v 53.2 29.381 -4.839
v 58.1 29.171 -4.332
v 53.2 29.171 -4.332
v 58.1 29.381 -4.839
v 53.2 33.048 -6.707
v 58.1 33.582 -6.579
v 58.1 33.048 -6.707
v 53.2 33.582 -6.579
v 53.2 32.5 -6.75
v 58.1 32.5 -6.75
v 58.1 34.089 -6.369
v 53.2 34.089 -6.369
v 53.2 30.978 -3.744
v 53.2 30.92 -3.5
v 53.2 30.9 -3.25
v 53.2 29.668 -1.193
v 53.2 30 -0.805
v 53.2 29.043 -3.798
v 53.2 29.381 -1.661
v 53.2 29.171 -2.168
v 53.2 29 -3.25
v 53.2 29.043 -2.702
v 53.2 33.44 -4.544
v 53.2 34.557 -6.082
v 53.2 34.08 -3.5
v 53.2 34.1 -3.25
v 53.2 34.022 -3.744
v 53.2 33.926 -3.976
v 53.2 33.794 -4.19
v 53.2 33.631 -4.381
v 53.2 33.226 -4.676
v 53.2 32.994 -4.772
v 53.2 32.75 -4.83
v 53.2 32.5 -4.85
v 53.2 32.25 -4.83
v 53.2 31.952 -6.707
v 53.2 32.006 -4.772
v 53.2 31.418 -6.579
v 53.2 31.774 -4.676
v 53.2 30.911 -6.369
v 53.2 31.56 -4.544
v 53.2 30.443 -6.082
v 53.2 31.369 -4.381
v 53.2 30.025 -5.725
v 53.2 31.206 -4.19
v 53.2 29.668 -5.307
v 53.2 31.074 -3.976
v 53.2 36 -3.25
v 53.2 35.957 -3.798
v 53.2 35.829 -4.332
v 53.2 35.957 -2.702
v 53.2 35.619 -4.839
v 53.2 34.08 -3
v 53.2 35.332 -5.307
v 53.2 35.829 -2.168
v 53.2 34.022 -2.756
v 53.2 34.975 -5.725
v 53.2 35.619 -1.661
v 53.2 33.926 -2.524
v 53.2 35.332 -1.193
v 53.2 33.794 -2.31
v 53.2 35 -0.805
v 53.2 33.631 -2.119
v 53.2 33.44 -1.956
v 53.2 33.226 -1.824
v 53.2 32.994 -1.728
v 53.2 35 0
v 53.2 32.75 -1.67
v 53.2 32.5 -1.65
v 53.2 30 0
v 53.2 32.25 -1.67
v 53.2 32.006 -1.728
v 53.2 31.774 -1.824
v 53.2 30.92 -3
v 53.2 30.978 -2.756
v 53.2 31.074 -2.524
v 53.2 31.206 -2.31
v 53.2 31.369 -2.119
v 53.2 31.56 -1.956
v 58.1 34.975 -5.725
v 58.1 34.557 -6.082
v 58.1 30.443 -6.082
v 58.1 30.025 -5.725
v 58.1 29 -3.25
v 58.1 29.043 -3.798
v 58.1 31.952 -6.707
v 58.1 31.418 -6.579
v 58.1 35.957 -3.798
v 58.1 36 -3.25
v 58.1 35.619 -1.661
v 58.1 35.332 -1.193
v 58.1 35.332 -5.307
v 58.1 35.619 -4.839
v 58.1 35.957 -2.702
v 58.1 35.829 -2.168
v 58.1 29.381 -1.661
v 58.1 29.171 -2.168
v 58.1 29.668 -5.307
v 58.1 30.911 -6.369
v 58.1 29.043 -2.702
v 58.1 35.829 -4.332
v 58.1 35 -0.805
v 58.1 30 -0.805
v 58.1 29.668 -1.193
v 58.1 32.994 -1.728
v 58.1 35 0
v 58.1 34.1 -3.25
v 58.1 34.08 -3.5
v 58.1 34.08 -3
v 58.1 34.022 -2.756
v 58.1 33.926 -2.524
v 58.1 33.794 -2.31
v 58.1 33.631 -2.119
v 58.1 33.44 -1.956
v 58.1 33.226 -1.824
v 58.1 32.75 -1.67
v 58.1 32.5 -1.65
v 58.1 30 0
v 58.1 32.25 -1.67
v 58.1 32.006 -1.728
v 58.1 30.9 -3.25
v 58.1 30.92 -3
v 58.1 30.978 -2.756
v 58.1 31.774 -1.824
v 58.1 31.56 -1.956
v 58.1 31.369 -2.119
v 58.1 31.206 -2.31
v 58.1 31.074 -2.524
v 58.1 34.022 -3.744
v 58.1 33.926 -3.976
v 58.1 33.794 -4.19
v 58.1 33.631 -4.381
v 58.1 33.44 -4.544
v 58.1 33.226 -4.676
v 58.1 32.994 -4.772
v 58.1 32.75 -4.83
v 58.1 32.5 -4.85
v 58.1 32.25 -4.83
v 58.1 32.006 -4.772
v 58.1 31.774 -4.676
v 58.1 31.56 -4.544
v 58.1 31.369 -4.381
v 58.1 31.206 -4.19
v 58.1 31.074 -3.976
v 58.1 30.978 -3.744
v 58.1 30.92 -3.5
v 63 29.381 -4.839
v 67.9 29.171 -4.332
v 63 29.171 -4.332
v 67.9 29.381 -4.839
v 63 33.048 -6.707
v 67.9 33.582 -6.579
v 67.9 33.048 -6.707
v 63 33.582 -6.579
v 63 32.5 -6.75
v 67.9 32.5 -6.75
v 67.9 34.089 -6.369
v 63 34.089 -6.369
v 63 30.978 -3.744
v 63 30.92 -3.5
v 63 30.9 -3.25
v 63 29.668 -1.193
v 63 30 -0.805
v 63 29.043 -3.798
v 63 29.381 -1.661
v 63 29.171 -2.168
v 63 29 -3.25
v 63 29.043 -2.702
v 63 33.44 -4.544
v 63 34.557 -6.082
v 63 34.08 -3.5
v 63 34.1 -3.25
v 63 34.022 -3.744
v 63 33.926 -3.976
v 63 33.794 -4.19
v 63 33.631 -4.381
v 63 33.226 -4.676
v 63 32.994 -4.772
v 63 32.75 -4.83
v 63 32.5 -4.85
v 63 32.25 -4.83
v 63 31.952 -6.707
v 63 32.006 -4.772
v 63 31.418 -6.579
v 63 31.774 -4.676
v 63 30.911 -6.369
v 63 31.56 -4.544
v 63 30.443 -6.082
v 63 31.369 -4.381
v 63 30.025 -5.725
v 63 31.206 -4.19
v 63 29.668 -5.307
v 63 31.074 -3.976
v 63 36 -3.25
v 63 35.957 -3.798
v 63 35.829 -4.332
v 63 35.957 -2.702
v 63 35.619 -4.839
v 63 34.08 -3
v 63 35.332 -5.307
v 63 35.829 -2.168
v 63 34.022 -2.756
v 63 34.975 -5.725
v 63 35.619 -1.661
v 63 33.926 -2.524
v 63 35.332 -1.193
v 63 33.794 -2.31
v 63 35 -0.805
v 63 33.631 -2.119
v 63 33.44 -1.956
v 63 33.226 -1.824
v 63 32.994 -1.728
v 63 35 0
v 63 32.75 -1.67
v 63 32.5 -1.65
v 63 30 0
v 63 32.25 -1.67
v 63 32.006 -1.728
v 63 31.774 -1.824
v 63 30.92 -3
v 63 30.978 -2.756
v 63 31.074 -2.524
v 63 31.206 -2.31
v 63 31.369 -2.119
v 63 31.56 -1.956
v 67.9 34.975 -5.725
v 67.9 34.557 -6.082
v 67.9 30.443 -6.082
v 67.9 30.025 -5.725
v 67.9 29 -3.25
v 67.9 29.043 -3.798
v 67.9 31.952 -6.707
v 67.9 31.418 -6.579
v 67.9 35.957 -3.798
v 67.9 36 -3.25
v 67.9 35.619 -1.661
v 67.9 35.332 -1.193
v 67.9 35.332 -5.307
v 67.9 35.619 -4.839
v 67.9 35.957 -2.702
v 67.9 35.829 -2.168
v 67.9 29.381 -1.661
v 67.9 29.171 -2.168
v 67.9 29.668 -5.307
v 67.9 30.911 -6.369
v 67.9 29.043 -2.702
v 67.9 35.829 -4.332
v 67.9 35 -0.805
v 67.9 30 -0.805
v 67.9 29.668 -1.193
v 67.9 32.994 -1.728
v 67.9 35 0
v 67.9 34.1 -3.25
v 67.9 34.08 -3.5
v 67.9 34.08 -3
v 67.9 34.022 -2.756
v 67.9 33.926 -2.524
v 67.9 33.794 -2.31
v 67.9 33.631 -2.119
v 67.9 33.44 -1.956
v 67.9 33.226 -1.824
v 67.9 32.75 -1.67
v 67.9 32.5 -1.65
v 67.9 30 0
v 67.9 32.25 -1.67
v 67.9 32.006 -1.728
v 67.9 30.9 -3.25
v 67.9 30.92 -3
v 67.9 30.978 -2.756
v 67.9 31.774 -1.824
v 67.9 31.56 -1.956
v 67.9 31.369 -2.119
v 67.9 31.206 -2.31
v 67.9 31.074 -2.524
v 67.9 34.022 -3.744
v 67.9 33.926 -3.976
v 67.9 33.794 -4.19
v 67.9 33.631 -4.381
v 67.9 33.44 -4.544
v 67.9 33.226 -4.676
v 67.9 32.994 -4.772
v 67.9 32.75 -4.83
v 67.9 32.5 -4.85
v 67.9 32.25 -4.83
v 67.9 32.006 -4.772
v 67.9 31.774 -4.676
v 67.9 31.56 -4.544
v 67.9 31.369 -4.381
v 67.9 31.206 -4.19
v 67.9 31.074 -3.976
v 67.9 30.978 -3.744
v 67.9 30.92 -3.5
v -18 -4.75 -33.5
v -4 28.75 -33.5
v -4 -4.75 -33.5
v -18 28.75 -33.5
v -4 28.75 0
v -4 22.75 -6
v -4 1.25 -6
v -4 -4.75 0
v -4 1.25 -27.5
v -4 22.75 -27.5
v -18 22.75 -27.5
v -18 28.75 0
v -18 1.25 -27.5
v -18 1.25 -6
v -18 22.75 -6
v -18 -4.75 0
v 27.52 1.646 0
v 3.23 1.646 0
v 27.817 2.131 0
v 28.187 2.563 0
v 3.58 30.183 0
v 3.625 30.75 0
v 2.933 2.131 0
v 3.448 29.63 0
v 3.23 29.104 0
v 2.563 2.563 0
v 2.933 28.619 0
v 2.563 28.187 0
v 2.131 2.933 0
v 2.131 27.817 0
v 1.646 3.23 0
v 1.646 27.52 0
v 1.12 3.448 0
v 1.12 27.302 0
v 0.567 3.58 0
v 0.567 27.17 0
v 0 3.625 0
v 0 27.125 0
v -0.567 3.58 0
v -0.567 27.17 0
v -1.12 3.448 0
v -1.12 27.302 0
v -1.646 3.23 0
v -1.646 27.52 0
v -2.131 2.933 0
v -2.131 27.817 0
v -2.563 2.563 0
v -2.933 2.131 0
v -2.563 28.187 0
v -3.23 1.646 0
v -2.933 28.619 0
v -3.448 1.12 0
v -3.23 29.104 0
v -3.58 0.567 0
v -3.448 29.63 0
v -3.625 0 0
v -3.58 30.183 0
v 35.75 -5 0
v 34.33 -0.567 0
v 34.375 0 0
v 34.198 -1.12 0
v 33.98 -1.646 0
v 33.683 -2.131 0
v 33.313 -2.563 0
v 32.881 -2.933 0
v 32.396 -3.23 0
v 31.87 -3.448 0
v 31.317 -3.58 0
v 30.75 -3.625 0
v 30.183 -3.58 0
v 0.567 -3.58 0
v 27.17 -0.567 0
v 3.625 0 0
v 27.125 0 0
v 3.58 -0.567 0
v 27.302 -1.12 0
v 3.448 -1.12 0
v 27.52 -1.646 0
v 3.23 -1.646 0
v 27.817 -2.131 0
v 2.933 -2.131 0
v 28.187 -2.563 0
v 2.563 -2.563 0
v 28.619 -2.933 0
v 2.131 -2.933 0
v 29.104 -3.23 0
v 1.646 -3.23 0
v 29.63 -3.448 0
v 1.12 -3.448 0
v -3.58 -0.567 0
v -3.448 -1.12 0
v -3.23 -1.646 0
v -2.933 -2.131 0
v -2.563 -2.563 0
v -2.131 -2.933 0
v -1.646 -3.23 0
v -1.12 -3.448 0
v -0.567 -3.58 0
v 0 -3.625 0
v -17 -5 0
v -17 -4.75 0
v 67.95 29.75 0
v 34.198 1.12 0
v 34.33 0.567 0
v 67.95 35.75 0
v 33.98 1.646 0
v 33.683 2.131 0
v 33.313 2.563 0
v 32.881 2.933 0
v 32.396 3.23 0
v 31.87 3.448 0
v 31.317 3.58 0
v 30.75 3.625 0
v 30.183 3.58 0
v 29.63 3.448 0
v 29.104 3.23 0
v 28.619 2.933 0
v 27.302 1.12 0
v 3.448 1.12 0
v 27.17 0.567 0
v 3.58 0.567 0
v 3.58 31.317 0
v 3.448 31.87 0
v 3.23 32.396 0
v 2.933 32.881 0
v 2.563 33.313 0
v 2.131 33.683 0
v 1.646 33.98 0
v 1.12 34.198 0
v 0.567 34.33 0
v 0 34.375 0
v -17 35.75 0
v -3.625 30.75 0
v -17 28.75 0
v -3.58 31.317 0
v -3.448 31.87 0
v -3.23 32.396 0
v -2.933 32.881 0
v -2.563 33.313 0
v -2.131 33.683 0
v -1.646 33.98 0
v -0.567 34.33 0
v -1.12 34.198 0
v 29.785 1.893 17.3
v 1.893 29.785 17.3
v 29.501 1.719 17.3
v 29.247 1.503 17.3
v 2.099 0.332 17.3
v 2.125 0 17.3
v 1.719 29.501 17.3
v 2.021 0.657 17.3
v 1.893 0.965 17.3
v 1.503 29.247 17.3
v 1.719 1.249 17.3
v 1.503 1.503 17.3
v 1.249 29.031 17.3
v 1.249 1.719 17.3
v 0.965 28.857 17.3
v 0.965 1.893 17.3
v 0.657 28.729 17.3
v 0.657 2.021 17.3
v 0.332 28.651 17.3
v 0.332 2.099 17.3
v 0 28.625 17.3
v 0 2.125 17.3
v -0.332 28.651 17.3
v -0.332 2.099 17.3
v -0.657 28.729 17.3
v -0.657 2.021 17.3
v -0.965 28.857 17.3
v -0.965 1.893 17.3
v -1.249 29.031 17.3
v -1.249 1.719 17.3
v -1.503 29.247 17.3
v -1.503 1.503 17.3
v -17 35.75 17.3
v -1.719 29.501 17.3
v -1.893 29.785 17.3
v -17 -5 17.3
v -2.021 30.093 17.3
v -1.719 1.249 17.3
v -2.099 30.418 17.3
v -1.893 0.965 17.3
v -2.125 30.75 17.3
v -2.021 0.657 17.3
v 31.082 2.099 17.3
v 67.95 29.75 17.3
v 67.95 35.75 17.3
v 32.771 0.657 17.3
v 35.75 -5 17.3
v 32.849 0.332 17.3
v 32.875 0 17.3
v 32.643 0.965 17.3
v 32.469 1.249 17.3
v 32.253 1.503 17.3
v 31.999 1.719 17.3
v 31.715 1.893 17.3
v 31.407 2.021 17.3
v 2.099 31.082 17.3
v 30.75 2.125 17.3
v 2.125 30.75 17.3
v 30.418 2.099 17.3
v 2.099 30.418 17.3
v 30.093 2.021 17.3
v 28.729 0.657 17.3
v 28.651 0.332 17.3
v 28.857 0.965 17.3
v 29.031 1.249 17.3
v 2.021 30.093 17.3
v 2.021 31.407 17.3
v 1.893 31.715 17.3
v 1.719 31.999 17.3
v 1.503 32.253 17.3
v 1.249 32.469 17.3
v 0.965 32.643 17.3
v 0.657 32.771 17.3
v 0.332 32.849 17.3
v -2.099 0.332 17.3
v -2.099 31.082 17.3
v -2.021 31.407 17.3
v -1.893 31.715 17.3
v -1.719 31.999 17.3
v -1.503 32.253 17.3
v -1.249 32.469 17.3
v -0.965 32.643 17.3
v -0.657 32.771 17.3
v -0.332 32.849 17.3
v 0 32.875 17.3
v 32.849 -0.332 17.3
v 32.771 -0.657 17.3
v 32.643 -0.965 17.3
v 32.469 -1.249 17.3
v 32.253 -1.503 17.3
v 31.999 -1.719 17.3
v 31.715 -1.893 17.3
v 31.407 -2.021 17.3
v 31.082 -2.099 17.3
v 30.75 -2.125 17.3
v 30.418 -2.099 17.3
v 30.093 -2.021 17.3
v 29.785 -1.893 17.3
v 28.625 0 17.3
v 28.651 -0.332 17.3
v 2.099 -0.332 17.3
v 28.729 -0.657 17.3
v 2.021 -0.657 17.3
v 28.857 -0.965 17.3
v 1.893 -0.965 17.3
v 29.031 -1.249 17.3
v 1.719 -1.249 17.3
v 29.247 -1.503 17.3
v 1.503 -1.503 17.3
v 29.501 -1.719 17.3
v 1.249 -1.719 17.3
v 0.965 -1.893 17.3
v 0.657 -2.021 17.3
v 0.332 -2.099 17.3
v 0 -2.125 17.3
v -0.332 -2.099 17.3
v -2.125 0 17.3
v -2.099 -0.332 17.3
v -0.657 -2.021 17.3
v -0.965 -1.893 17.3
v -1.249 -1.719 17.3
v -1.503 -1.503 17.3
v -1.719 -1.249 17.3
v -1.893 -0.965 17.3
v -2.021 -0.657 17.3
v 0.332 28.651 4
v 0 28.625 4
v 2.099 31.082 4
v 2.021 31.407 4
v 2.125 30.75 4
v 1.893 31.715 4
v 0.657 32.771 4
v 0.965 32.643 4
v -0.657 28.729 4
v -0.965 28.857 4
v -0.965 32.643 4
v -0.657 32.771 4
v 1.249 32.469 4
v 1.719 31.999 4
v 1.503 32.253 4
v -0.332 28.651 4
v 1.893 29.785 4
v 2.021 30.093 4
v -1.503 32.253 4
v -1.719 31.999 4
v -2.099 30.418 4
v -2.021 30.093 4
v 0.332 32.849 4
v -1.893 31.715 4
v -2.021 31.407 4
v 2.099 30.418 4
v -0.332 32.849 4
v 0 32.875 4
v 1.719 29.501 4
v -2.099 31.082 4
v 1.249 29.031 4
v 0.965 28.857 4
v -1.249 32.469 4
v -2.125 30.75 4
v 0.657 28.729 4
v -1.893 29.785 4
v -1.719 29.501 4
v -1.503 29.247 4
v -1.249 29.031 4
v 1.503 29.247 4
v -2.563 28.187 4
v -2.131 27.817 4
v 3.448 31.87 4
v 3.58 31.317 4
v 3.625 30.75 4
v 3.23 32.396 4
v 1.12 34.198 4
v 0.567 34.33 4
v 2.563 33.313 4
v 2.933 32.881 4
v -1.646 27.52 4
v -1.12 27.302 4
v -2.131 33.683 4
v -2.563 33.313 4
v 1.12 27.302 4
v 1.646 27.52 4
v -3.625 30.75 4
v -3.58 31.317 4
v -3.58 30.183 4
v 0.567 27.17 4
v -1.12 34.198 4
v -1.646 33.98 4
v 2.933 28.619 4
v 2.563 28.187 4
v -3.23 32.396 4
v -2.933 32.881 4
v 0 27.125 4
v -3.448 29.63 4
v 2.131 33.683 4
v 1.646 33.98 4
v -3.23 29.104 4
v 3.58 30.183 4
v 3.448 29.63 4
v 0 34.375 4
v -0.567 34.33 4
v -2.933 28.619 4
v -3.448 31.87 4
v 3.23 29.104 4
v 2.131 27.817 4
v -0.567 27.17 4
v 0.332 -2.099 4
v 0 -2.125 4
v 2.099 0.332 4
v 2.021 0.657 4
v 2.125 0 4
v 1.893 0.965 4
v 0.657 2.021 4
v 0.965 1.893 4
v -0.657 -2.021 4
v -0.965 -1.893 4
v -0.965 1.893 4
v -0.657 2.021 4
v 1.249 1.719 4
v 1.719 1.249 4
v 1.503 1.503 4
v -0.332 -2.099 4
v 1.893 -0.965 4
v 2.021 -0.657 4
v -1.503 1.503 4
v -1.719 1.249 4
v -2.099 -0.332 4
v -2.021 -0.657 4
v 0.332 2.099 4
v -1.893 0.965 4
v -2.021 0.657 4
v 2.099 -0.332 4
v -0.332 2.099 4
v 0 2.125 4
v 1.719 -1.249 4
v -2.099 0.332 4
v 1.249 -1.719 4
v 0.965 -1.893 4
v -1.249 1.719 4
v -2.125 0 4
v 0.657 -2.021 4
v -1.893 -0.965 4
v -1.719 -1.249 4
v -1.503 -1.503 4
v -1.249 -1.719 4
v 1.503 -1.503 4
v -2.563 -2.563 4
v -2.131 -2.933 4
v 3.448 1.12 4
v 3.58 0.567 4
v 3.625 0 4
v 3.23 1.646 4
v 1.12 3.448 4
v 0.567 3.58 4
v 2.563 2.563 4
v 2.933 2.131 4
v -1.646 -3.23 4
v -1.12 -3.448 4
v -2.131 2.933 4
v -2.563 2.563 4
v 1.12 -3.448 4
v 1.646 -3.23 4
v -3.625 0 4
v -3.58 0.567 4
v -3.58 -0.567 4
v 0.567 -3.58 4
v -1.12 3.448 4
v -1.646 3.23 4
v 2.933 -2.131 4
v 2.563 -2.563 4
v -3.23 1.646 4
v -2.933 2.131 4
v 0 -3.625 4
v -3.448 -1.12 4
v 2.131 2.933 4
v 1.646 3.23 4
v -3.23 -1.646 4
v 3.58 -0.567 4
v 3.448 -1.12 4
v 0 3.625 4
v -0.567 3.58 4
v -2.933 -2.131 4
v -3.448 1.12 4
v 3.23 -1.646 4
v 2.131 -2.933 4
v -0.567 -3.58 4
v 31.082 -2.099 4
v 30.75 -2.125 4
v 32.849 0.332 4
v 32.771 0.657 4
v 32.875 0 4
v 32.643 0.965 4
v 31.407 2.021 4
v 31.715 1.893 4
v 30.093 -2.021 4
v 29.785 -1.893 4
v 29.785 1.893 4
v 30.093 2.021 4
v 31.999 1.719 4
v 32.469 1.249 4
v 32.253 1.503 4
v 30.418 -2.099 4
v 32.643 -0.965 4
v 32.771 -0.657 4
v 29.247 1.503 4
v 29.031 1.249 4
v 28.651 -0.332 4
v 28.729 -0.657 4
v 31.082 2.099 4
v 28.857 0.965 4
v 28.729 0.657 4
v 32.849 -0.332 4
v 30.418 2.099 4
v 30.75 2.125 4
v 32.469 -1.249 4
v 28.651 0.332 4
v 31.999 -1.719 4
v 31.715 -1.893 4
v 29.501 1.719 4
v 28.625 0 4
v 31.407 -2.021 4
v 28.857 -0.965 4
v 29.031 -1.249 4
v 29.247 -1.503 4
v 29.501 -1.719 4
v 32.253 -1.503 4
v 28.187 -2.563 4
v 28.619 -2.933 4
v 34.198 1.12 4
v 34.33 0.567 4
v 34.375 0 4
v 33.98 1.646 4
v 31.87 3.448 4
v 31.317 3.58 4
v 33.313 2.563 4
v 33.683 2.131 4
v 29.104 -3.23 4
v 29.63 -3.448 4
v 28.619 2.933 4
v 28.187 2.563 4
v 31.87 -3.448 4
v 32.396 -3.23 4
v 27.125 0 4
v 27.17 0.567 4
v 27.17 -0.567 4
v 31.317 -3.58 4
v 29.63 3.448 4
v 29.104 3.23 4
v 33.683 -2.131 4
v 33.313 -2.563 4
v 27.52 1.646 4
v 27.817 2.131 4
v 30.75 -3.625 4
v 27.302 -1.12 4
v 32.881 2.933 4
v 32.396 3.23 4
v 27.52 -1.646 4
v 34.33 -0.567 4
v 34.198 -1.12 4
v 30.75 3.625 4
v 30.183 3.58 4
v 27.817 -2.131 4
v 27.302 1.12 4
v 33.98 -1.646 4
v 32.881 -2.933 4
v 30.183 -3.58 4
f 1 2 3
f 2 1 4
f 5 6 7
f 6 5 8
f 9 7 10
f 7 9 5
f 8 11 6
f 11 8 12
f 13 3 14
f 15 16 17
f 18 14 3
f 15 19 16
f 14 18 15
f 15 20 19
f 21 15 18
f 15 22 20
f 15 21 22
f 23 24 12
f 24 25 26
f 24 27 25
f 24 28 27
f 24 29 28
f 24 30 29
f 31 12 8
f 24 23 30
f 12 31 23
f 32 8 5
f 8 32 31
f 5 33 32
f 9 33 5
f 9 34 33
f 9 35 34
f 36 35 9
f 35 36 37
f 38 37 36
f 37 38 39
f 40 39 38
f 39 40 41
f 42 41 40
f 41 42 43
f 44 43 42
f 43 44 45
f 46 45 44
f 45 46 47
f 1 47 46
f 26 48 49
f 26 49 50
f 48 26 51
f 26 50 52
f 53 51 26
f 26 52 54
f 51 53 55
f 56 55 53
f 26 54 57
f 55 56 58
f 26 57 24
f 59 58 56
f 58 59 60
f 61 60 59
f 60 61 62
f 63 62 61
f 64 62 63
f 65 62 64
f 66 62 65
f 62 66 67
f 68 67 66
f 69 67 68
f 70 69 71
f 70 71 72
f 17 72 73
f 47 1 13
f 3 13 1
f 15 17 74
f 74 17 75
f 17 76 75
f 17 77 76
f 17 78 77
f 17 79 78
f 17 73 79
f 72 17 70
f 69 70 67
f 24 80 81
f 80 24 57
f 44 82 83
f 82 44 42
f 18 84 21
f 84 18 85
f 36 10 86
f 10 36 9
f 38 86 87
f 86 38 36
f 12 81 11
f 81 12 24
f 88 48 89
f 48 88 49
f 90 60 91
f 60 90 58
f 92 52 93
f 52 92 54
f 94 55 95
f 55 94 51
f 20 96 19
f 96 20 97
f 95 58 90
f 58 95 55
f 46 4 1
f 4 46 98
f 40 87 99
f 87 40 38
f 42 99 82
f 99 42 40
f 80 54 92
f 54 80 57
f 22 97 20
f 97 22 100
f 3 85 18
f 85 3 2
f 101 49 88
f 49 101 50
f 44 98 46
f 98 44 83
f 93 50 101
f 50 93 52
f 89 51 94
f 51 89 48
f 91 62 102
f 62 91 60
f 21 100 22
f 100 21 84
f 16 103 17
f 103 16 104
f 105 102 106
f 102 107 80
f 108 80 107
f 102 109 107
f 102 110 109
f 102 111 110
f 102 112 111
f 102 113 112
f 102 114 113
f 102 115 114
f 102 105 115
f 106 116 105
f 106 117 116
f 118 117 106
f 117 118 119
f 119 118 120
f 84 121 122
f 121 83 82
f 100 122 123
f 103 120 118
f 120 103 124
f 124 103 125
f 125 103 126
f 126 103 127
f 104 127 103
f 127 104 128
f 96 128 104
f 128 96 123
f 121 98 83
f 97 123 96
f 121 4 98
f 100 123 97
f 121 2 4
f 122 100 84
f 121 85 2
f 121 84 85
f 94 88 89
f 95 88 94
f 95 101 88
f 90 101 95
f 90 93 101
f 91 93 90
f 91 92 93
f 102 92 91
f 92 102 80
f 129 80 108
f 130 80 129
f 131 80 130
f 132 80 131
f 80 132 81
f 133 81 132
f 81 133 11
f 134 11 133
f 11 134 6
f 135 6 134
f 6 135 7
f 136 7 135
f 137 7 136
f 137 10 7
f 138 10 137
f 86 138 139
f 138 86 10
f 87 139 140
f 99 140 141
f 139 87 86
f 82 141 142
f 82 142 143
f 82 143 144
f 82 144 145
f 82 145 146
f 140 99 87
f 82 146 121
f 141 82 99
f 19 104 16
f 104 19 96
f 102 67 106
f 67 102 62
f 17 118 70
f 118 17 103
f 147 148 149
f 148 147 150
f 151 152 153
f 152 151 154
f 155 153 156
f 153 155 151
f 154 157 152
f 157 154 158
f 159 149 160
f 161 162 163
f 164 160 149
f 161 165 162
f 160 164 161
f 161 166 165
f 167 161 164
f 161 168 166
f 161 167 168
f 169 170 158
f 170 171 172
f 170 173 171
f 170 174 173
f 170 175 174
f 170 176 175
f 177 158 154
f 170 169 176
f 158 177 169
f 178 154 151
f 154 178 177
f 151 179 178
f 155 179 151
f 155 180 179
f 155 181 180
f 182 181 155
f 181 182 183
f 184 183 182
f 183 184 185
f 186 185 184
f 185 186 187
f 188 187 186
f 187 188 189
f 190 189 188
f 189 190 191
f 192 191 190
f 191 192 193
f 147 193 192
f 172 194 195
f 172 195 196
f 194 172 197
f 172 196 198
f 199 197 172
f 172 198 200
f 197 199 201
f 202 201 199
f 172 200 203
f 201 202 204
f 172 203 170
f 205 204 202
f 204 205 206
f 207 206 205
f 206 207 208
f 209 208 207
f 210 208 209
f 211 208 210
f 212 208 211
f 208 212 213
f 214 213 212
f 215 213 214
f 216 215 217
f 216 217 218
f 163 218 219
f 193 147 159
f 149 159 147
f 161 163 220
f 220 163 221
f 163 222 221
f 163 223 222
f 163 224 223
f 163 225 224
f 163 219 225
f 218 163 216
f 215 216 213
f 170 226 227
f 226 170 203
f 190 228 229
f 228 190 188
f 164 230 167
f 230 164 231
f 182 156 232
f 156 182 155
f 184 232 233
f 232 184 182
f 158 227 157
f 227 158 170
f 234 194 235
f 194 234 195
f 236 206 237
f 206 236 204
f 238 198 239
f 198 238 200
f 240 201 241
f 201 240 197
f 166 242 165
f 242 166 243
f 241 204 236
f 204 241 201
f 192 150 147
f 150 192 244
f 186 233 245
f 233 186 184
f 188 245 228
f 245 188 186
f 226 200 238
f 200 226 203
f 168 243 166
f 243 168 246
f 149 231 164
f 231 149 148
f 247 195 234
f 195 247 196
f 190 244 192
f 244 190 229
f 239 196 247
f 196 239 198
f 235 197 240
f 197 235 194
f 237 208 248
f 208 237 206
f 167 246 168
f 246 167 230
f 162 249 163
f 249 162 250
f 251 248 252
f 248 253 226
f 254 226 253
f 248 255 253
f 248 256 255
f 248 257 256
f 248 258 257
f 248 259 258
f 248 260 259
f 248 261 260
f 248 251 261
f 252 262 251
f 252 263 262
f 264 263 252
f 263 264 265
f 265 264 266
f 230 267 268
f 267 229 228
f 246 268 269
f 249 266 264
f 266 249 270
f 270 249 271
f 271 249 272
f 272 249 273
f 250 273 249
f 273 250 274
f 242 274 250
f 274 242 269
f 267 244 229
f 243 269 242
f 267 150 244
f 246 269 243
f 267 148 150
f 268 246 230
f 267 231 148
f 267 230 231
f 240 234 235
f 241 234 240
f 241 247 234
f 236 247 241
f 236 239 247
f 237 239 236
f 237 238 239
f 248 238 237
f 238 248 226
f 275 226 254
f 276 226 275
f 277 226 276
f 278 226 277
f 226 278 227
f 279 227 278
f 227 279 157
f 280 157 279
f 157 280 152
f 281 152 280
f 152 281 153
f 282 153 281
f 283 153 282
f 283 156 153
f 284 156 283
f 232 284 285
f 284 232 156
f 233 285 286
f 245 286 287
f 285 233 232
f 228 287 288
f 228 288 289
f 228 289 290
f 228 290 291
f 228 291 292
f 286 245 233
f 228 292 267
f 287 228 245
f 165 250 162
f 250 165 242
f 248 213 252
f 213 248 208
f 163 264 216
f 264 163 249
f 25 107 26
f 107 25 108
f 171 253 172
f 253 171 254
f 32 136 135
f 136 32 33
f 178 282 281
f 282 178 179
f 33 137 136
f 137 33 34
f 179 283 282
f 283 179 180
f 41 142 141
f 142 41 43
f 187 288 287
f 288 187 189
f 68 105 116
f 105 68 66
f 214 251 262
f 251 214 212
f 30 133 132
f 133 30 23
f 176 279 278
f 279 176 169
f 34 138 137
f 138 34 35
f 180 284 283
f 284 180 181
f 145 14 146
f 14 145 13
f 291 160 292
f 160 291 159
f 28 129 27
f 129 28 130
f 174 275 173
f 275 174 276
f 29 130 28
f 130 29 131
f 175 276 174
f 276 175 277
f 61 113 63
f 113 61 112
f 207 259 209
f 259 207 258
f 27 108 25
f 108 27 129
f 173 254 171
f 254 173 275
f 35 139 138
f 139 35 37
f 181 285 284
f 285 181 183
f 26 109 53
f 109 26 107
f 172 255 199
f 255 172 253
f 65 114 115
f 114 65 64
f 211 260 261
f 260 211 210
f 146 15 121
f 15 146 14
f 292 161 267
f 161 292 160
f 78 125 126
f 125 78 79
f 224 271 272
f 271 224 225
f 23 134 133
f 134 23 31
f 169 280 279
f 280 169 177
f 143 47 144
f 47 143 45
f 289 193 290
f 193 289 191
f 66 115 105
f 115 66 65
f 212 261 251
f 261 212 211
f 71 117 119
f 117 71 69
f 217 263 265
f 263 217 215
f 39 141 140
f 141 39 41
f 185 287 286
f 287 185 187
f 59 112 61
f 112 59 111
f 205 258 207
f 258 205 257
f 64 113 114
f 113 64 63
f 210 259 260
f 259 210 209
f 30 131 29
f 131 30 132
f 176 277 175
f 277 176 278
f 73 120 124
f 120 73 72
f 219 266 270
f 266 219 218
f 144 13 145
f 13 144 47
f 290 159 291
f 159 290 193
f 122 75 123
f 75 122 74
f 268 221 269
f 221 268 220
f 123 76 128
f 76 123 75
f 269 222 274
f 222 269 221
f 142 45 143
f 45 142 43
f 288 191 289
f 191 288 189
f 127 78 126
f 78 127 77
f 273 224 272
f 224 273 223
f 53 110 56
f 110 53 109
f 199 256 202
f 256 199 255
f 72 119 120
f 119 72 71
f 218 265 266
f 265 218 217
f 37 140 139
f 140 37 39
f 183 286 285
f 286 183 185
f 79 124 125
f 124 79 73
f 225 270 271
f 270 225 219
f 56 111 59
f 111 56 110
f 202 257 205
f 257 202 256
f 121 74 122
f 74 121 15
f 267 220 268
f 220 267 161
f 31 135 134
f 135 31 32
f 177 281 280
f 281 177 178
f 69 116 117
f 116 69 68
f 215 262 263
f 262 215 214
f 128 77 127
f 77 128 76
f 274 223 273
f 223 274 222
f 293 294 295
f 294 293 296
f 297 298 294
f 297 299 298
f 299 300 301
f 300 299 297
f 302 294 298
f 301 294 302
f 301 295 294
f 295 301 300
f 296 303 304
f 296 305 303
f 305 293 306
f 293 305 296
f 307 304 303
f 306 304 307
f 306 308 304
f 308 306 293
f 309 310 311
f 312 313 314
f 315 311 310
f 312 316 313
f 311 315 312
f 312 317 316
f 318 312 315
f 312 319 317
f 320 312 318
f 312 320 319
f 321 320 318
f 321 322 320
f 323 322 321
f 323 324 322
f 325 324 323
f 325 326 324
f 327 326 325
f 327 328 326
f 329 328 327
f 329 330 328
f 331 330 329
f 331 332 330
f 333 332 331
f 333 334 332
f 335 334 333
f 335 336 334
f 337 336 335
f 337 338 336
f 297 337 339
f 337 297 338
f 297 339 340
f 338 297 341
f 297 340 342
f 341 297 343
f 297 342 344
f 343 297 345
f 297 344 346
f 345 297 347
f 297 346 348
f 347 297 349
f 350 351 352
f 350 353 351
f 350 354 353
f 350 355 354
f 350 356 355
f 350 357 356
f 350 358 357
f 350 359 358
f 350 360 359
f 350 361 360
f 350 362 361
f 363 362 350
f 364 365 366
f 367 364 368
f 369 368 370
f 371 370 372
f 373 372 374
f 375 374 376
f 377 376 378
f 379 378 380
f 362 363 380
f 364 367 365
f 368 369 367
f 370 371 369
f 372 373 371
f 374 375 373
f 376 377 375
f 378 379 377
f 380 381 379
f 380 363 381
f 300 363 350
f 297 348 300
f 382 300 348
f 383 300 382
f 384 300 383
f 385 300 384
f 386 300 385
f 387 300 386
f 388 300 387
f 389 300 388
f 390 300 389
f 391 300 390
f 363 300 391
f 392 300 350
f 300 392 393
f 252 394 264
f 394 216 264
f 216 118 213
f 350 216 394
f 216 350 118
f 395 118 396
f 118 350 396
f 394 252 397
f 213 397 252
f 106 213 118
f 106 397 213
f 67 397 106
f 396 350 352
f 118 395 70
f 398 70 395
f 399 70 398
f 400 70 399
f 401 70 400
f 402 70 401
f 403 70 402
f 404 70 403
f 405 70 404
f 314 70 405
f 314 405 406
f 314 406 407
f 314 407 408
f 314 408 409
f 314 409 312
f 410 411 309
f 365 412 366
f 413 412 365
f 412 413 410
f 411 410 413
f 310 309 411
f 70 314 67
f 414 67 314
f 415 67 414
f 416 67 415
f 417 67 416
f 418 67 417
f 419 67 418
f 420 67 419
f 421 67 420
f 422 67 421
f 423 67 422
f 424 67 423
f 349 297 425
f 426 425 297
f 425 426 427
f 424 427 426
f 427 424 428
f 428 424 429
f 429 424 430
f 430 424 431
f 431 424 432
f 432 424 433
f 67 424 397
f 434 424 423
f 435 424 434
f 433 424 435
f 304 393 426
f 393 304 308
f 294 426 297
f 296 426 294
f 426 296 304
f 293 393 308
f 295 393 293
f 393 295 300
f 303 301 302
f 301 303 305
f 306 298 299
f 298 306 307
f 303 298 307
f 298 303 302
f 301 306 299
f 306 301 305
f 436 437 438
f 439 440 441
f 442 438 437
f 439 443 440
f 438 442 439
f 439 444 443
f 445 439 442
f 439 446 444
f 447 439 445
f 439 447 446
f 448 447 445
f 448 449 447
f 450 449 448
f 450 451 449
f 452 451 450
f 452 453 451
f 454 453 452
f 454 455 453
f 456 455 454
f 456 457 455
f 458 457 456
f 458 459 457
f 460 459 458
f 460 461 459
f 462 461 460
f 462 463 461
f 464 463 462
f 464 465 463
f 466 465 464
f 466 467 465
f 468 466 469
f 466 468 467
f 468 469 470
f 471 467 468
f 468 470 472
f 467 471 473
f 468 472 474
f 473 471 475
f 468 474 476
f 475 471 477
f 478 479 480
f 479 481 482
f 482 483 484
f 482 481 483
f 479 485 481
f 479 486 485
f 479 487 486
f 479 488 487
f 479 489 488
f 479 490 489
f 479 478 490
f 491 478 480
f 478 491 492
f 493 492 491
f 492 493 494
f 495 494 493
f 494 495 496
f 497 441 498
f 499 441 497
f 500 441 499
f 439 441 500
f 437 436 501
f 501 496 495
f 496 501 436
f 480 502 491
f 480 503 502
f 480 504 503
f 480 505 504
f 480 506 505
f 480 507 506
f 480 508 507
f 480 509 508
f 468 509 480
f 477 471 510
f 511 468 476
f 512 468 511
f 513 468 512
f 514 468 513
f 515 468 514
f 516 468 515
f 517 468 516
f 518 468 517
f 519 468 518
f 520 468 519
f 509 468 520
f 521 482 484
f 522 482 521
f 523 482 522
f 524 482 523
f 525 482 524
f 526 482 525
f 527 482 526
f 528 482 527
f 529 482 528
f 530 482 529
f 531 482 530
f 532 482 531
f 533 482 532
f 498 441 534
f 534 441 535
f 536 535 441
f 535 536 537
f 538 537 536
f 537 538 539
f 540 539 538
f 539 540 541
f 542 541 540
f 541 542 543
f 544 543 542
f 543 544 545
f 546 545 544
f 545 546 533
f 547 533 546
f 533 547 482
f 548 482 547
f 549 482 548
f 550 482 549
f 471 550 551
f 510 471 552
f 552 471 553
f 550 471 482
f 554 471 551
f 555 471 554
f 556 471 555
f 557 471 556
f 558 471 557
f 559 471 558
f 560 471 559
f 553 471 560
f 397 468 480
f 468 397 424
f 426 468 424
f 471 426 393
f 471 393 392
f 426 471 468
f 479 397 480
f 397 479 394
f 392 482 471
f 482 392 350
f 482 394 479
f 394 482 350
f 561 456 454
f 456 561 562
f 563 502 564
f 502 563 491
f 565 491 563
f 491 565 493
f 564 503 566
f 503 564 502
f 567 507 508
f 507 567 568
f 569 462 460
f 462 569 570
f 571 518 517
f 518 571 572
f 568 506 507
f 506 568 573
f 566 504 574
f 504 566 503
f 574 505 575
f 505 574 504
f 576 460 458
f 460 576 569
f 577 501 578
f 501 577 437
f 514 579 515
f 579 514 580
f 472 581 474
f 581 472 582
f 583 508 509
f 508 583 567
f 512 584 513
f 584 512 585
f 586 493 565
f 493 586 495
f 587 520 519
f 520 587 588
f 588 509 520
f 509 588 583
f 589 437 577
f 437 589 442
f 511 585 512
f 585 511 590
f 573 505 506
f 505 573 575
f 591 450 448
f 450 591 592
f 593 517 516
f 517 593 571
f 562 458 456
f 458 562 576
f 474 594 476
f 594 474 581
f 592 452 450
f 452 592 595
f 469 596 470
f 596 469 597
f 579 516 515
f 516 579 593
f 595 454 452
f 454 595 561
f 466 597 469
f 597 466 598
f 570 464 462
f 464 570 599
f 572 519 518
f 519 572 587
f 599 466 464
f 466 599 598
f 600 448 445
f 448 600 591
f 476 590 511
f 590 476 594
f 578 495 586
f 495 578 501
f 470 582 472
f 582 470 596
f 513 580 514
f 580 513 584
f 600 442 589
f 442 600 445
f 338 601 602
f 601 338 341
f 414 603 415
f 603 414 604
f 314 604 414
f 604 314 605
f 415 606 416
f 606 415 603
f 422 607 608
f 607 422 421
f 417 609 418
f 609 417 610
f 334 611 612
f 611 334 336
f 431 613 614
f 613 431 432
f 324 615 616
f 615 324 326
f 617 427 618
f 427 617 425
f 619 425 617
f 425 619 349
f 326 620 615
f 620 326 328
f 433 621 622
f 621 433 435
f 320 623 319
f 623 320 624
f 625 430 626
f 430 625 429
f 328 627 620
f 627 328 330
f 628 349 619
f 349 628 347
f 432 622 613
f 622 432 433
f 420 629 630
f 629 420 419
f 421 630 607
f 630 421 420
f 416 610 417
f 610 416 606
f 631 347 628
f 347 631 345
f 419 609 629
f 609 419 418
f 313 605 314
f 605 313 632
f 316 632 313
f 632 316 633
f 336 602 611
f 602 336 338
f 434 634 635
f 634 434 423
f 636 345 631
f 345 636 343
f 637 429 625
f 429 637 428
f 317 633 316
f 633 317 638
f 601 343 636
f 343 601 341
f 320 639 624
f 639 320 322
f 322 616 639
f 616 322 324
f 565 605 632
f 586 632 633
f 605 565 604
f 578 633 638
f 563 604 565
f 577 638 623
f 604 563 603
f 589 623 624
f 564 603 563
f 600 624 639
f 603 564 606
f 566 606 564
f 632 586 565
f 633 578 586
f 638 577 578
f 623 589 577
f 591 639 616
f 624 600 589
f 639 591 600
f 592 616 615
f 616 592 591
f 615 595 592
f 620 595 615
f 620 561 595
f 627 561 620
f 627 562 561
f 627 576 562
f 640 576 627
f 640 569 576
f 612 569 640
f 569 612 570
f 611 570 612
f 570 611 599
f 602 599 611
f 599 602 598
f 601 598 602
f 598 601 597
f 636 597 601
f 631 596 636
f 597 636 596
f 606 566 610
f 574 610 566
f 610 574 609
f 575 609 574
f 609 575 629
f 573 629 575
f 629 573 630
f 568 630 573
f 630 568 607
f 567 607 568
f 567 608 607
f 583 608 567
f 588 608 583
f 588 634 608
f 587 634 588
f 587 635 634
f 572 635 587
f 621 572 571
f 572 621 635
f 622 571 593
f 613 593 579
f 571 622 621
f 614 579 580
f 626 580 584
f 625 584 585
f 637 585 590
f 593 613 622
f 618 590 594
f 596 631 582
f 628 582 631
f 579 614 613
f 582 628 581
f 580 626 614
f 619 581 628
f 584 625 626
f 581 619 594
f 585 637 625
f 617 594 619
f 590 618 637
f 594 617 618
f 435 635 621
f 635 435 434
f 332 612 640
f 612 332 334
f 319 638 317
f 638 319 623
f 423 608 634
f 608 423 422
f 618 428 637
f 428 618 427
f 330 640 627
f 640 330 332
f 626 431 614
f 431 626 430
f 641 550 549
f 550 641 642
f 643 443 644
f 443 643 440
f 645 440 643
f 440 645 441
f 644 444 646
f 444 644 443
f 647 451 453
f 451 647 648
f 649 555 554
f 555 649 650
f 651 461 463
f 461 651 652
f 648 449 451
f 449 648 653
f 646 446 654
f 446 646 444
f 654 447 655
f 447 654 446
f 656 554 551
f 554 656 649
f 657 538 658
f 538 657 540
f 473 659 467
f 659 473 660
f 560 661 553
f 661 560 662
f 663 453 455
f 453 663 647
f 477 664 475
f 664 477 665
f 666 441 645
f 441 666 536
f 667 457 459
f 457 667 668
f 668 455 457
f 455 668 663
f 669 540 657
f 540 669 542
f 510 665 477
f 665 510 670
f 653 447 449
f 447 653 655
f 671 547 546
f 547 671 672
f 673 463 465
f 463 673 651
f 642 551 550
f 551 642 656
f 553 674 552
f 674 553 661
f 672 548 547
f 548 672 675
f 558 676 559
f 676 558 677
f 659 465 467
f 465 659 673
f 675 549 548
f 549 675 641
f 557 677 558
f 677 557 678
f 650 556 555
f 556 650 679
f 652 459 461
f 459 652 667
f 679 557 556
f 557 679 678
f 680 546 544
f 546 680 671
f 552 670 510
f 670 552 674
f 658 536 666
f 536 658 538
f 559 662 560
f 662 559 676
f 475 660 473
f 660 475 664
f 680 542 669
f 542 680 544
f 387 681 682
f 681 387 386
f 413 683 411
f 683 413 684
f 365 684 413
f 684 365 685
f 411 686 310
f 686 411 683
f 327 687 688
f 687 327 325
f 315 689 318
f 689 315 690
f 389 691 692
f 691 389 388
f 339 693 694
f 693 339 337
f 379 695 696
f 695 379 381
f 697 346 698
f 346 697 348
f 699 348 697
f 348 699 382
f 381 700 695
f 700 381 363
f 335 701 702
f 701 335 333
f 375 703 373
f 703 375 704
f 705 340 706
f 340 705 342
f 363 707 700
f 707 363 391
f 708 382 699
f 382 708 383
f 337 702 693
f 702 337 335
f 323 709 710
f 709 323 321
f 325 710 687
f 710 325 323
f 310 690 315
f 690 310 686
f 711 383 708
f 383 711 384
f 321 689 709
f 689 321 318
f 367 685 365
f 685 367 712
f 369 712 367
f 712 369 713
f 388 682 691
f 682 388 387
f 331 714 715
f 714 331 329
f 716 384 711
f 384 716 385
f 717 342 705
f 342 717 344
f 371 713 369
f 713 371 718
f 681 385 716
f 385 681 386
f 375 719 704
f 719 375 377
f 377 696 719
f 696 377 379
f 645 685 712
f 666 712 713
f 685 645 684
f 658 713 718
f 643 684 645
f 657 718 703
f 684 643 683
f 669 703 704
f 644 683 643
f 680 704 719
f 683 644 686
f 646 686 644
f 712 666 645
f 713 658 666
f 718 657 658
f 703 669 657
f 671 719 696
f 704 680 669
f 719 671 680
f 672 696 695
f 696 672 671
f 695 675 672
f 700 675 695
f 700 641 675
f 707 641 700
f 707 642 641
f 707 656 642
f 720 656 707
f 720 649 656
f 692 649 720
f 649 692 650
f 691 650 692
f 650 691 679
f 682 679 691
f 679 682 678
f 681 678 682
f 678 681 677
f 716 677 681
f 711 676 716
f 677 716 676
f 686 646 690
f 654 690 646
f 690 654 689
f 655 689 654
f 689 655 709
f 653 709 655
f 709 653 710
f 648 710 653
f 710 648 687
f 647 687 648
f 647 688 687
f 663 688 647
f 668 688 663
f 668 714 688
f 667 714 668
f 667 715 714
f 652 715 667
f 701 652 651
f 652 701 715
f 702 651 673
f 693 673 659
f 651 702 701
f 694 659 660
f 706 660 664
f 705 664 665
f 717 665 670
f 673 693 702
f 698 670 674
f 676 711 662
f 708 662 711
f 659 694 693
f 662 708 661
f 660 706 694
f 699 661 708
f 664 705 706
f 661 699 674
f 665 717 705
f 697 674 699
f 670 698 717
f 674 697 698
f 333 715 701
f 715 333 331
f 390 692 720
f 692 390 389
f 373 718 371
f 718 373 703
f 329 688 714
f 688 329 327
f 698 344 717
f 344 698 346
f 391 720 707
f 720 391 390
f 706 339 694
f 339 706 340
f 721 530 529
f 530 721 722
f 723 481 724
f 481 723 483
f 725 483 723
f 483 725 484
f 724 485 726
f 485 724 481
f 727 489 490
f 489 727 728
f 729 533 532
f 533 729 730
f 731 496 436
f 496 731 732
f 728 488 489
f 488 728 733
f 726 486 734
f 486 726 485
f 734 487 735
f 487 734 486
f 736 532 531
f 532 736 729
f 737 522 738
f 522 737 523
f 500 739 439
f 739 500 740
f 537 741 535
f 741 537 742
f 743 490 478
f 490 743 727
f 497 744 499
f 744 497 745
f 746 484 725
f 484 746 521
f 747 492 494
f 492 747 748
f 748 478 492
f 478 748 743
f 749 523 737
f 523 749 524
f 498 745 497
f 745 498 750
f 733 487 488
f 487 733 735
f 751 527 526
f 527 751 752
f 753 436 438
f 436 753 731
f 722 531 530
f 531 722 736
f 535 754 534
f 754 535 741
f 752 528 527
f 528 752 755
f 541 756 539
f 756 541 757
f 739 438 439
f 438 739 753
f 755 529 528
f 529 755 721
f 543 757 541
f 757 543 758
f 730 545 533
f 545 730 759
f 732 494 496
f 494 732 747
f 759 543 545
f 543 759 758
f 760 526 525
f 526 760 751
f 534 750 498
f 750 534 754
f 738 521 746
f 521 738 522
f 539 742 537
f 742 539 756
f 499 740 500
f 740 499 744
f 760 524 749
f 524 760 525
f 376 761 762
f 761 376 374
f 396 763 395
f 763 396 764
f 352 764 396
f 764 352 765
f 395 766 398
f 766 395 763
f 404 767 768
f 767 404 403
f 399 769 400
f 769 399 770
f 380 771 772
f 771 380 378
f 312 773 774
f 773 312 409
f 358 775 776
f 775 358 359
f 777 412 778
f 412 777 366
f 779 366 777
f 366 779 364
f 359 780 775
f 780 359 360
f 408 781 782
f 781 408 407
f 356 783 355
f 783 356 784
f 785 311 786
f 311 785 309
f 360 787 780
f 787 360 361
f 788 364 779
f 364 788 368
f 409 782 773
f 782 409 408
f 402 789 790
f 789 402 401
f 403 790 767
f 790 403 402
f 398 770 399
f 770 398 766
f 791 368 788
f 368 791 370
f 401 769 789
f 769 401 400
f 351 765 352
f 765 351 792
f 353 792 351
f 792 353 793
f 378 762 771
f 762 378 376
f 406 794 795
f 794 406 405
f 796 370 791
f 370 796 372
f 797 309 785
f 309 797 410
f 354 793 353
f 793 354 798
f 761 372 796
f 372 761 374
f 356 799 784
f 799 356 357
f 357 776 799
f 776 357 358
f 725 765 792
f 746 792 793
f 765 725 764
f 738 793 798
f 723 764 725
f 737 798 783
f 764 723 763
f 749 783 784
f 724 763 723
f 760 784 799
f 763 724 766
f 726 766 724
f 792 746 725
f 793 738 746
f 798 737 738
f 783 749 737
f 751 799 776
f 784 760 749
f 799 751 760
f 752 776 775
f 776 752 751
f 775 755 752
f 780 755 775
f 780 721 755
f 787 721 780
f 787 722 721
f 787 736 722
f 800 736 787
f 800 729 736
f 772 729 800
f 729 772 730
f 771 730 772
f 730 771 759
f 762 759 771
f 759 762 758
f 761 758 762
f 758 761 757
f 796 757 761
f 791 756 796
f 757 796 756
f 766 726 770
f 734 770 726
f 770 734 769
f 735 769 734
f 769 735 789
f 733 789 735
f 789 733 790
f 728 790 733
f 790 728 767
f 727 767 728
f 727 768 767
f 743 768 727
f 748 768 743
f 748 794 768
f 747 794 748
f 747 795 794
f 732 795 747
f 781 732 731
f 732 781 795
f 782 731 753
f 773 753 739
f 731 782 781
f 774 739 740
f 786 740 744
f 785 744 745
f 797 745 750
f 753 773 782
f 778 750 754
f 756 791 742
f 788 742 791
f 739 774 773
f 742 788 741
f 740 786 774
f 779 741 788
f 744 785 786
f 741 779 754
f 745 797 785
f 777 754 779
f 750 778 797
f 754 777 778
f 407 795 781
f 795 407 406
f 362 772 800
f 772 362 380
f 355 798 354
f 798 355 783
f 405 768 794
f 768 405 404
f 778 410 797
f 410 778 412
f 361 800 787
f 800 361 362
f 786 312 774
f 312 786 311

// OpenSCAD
// Sovol Z-Axis Mounting Block
// Mounts to the blue Z-axis plate via 3 bolt holes with heat inserts

// --- Plate Dimensions (reference) ---
plate_width = 44;          // total X width including miter
plate_tab_width = 35;      // upper tab width after miter cut
plate_depth = 17.3;        // plate depth (Z)
plate_height = 60.2;       // total height (Y)

// --- Hole Parameters ---
hole_diameter = 5.3;       // heat insert hole in plate
bolt_clearance = 4.25;      // M3 bolt clearance hole for mounting block
hole_spacing = 30.75;      // spacing between holes in X and Y

// --- Block Parameters ---
wall = 5;                  // wall thickness around outermost holes
block_depth = 17.3;        // block depth (Z), matches plate depth

// Hole positions (origin = bottom-left hole)
// 3 holes in L-pattern:
//   hole 1: top-left
//   hole 2: bottom-left
//   hole 3: bottom-right
holes = [
    [0, hole_spacing],          // top-left
    [0, 0],                     // bottom-left
    [hole_spacing, 0],          // bottom-right
];

// Block dimensions derived from hole pattern + wall margin
block_width = hole_spacing + wall * 2;
block_height = hole_spacing + wall * 2;

// --- Hinge Parameters (from klipper-camera-adapter) ---
joint_bolt_d = 3.2;            // bolt/pin clearance
joint_knuckle_d = 7;           // outer diameter of knuckle
joint_knuckles = 5;            // total knuckle count (keeps knuckle_len compatible)
joint_clearance = 0.2;         // printing tolerance
knuckle_len = block_depth / joint_knuckles;
block_knuckle_count = 2;       // only render 2 knuckles on block side
ring_knuckle_len = 4.9;        // width of each ring knuckle

$fn = 40;

// --- Hinge layout (all world-space, like klipper-camera-adapter) ---
// Hinge axis along X, beyond block right face, near bottom edge
block_right = block_width - wall;
hinge_joint_x = block_right + joint_knuckle_d / 2;  // ring center X
hinge_joint_y = -wall + joint_knuckle_d / 2;        // ring center Y (near bottom)
stem_h = wall;                                        // stem thickness (Y)

// Printable hinge bolt
bolt_shaft_d = joint_bolt_d - joint_clearance * 2;
bolt_shaft_len = block_depth + 2;
bolt_head_d = joint_knuckle_d;
bolt_head_h = 3;

module hinge_bolt() {
    cylinder(d = bolt_head_d, h = bolt_head_h);
    translate([0, 0, bolt_head_h])
        cylinder(d = bolt_shaft_d, h = bolt_shaft_len);
}

// === Main Block with Hinge ===
module mount_block() {
    difference() {
        union() {
            // Main block
            translate([-wall, -wall, 0])
            hull() {
                translate([-12, 0, 0])
                cube([block_width+12, block_height, block_depth]);

                translate([block_width, block_height-6, 0])
                    cube([42-9.8, 6, block_depth]);
            }

            translate([63-9.8, 34, 36])
            rotate([0, 90, 0])
            rings();   

            // hdmi cable passthrough
            translate([-11, 12, -16.75])
            rotate([0, 90, 0])
            hdmi_passthrough();
        }

        // Bolt clearance holes
        for (h = holes) {
            translate([h[0], h[1], 0])
            bolt_hole();
        }
    }
}

module bolt_hole() {
    union() {
        cylinder(d = bolt_clearance, h = block_depth + 2);
        cylinder(d = 7.25, h = 4);
    }
}

module hdmi_passthrough() {
    gap = 21.5;
    width = 6;
    height = 14;

    difference() {
        cube([gap + width*2, gap + width*2, height], center = true);
        cube([gap, gap, height], center = true);
    }
}

module rings() {
  block_indices = [0, 2];

  difference() {
    union () {
      // Rings + standoff stems (world-space, klipper pattern)
      for (i = block_indices) {
          z_pos = i * ring_knuckle_len;
          // Ring: cylinder along Z at hinge position
          translate([hinge_joint_x, hinge_joint_y, z_pos])
              cylinder(d = joint_knuckle_d, h = ring_knuckle_len);
          // Standoff stem: from block right face to ring center
          translate([block_right, hinge_joint_y - stem_h / 2, z_pos])
              cube([hinge_joint_x - block_right, stem_h, ring_knuckle_len]);
        }
    }

    // Hinge pin hole through all knuckle positions
    translate([hinge_joint_x, hinge_joint_y, -0.1])
        cylinder(d = joint_bolt_d, h = block_depth + 0.2);
  }
}

// Camera-arm-side knuckles (for later)
module hinge_knuckles_arm() {
    arm_indices = [1, 3, 4];
    difference() {
        union() {
            for (i = arm_indices)
                translate([hinge_joint_x, hinge_joint_y, i * knuckle_len])
                    cylinder(d = joint_knuckle_d, h = knuckle_len);
        }
        translate([hinge_joint_x, hinge_joint_y, -0.1])
            cylinder(d = joint_bolt_d, h = block_depth + 0.2);
    }
}

// === PREVIEW ===
mount_block();
// hinge_knuckles_arm();
// translate([40, 0, 0]) hinge_bolt();
